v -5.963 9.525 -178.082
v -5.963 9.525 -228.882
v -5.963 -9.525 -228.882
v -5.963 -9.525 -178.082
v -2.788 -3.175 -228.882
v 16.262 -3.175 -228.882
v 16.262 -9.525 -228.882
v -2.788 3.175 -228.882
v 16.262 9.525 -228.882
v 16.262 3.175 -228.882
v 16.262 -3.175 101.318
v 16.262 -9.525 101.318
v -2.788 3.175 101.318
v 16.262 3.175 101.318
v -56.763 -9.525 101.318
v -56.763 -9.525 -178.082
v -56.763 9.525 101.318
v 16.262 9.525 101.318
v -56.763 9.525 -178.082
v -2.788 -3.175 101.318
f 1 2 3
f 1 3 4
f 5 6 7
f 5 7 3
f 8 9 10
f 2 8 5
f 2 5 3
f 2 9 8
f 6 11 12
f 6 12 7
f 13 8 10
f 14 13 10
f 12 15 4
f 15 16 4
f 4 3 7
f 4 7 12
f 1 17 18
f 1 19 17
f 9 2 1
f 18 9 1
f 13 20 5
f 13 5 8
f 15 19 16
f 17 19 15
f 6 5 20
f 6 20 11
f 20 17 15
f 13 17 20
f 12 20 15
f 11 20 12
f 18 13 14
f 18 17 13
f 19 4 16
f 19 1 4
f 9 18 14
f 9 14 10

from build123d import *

# Parameters (mm, degrees)
BOSS_EXTRUDE1_DEPTH = 9.525
CUT_EXTRUDE1_REACH  = 337.179
SKETCH2_W           = 19.05
SKETCH2_H           = 6.35


with BuildPart() as part:
    # Sketch1 → Boss-Extrude1 (new, symmetric)
    with BuildSketch(Plane(origin=(0, 0, 0), x_dir=(1, 0, 0), z_dir=(0, 1, 0))):
        Polygon((-56.762661738, -101.318299445), (16.262338262, -101.318299445), (16.262338262, 228.881700555), (-5.962661738, 228.881700555), (-5.962661738, 178.081700555), (-56.762661738, 178.081700555), align=None)
    extrude(amount=BOSS_EXTRUDE1_DEPTH, both=True)

    # Sketch2 → Cut-Extrude1 (cut, up to next)
    with BuildSketch(Plane.XY.offset(101.318299445), mode=Mode.PRIVATE) as cut_extrude1_sk1:
        with Locations((6.737338262, 0)):
            Rectangle(SKETCH2_W, SKETCH2_H)
    cut_extrude1_tool1 = extrude(cut_extrude1_sk1.sketch, amount=-CUT_EXTRUDE1_REACH, mode=Mode.PRIVATE) & part.part
    add(cut_extrude1_tool1.solids().sort_by_distance((6.737338, 0, 101.318299))[0], mode=Mode.SUBTRACT)


solid = part.part
